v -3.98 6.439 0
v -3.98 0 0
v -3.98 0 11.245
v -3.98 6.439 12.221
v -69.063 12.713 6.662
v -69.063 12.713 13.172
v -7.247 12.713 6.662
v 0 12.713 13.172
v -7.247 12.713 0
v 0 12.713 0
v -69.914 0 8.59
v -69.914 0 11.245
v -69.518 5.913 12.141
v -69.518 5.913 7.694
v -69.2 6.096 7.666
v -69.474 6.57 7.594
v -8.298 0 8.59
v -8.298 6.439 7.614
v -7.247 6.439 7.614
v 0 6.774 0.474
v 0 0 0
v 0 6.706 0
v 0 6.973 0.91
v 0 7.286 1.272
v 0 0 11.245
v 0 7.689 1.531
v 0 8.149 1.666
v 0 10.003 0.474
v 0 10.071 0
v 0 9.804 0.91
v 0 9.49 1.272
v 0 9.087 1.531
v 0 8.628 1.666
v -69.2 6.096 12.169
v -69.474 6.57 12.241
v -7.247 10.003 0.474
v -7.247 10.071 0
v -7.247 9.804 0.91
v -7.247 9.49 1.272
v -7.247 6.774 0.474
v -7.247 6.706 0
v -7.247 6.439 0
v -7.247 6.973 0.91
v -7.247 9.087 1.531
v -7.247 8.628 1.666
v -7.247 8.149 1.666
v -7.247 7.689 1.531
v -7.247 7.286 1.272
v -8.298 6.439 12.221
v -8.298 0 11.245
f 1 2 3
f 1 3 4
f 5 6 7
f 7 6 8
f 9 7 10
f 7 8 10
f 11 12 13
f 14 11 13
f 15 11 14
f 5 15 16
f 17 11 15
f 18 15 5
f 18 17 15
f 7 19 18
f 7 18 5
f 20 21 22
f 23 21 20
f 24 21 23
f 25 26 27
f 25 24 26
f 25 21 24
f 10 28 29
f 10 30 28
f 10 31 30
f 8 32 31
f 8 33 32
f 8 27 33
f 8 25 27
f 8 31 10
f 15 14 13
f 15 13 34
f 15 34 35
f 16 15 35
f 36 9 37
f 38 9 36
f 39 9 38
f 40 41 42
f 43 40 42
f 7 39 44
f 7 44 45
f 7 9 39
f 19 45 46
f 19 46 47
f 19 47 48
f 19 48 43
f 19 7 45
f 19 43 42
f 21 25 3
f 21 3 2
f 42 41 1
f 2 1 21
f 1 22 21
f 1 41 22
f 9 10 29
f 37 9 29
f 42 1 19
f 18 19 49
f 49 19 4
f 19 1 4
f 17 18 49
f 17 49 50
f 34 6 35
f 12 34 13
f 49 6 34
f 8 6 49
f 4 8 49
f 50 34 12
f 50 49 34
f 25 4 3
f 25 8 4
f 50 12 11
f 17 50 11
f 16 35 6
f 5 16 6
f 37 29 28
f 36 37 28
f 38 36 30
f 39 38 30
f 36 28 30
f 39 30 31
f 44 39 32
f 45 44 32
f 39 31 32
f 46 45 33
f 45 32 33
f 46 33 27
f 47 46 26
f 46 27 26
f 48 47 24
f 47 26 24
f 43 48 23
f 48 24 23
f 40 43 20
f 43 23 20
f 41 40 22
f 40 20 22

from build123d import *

# Parameters (mm, degrees)
F5_DEPTH  = 69.9135
F7_DEPTH  = 3.98018
F9_DEPTH  = 3.26644
F10_W     = 4.318
F10_H     = 6.4389
F11_DEPTH = 25.4
F12_R     = 1.68275
F13_DEPTH = 69.9145
F16_DEPTH = 13.17344
F18_DEPTH = 13.17344


# Not quite as in the source:
# - a variable given as a bare number and used for a length is read in inches; the dataset says mm whatever the document's units were


with BuildPart() as f5:
    # F4 (on Right) → F5 (new body)
    with BuildSketch(Plane.YZ):
        Polygon((12.7127, 13.17244), (0, 11.24458), (0, 8.59028), (12.7127, 6.66242), align=None)
    extrude(amount=-F5_DEPTH)

    # F6 (on face) → F7 (join)
    with BuildSketch(Plane.YZ):
        Polygon((12.7127, 0), (12.7127, 6.66242), (0, 8.59028), (0, 0), align=None)
    extrude(amount=-F7_DEPTH)

    # F8 (on face) → F9 (join)
    with BuildSketch(Plane(origin=(-3.98018, 0, 0), x_dir=(0, -1, 0), z_dir=(-1, 0, 0))):
        Polygon((-6.4389, 7.6138314286), (-12.7127, 6.66242), (-12.7127, 0), (-6.4389, 0), align=None)
    extrude(amount=F9_DEPTH)

    # F10 (on face) → F11 (cut)
    with BuildSketch(Plane(origin=(0, 0, 0), x_dir=(1, 0, 0), z_dir=(0, 0, -1))):
        with Locations((-6.13918, -3.21945)):
            Rectangle(F10_W, F10_H)
    extrude(amount=-F11_DEPTH, mode=Mode.SUBTRACT)

    # F12 (on face) → F13 (cut, through all)
    with BuildSketch(Plane.YZ):
        with Locations((8.38835, 0)):
            Circle(F12_R)
    extrude(amount=-F13_DEPTH, mode=Mode.SUBTRACT)

    # F15 (on offset) → F16 (cut, through all)
    with BuildSketch(Plane.XY.offset(13.17244)):
        Polygon((-69.9135, 12.7127), (-69.9135, 0), (-69.0626, 12.7127), align=None)
    extrude(amount=-F16_DEPTH, mode=Mode.SUBTRACT)

    # F17 (on offset) → F18 (cut, through all)
    with BuildSketch(Plane.XY.offset(13.17244)):
        Polygon((-69.1999940296, 6.096), (-69.4737402245, 6.570142318), (-69.5177555441, 5.9125403041), align=None)
    extrude(amount=-F18_DEPTH, mode=Mode.SUBTRACT)


solid = f5.part
